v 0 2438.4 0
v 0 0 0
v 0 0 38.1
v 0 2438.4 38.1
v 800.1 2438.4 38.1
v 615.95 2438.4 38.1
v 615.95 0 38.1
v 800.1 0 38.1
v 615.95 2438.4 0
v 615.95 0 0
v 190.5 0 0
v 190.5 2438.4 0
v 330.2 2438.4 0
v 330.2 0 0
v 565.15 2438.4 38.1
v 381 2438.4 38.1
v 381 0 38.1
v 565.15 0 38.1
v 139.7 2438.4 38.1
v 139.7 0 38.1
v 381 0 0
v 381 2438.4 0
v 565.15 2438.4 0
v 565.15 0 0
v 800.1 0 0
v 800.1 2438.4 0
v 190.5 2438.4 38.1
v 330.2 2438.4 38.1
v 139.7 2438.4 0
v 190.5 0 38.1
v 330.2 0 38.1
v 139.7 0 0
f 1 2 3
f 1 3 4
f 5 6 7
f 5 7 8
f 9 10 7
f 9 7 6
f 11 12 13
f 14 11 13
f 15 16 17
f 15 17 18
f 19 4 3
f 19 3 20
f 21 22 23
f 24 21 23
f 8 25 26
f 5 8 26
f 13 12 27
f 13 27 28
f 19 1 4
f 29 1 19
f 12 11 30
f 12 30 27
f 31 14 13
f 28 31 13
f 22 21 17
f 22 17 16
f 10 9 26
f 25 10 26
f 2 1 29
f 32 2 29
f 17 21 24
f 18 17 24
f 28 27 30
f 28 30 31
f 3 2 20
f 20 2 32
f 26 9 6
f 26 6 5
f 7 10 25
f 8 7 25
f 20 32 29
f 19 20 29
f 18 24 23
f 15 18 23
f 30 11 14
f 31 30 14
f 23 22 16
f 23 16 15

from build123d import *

# Parameters (mm, degrees)
F0_W     = 139.7
F0_H     = 2438.4
F0_W_2   = 184.15
F1_DEPTH = 38.1


with BuildPart() as f1:
    # F0 (on Top) → F1 (new body)
    with BuildSketch(Plane.XY):
        with Locations((69.85, 1219.2)):
            Rectangle(F0_W, F0_H)
        with Locations((260.35, 1219.2)):
            Rectangle(F0_W, F0_H)
        with Locations((473.075, 1219.2)):
            Rectangle(F0_W_2, F0_H)
        with Locations((708.025, 1219.2)):
            Rectangle(F0_W_2, F0_H)
    extrude(amount=F1_DEPTH)


solid = f1.part
